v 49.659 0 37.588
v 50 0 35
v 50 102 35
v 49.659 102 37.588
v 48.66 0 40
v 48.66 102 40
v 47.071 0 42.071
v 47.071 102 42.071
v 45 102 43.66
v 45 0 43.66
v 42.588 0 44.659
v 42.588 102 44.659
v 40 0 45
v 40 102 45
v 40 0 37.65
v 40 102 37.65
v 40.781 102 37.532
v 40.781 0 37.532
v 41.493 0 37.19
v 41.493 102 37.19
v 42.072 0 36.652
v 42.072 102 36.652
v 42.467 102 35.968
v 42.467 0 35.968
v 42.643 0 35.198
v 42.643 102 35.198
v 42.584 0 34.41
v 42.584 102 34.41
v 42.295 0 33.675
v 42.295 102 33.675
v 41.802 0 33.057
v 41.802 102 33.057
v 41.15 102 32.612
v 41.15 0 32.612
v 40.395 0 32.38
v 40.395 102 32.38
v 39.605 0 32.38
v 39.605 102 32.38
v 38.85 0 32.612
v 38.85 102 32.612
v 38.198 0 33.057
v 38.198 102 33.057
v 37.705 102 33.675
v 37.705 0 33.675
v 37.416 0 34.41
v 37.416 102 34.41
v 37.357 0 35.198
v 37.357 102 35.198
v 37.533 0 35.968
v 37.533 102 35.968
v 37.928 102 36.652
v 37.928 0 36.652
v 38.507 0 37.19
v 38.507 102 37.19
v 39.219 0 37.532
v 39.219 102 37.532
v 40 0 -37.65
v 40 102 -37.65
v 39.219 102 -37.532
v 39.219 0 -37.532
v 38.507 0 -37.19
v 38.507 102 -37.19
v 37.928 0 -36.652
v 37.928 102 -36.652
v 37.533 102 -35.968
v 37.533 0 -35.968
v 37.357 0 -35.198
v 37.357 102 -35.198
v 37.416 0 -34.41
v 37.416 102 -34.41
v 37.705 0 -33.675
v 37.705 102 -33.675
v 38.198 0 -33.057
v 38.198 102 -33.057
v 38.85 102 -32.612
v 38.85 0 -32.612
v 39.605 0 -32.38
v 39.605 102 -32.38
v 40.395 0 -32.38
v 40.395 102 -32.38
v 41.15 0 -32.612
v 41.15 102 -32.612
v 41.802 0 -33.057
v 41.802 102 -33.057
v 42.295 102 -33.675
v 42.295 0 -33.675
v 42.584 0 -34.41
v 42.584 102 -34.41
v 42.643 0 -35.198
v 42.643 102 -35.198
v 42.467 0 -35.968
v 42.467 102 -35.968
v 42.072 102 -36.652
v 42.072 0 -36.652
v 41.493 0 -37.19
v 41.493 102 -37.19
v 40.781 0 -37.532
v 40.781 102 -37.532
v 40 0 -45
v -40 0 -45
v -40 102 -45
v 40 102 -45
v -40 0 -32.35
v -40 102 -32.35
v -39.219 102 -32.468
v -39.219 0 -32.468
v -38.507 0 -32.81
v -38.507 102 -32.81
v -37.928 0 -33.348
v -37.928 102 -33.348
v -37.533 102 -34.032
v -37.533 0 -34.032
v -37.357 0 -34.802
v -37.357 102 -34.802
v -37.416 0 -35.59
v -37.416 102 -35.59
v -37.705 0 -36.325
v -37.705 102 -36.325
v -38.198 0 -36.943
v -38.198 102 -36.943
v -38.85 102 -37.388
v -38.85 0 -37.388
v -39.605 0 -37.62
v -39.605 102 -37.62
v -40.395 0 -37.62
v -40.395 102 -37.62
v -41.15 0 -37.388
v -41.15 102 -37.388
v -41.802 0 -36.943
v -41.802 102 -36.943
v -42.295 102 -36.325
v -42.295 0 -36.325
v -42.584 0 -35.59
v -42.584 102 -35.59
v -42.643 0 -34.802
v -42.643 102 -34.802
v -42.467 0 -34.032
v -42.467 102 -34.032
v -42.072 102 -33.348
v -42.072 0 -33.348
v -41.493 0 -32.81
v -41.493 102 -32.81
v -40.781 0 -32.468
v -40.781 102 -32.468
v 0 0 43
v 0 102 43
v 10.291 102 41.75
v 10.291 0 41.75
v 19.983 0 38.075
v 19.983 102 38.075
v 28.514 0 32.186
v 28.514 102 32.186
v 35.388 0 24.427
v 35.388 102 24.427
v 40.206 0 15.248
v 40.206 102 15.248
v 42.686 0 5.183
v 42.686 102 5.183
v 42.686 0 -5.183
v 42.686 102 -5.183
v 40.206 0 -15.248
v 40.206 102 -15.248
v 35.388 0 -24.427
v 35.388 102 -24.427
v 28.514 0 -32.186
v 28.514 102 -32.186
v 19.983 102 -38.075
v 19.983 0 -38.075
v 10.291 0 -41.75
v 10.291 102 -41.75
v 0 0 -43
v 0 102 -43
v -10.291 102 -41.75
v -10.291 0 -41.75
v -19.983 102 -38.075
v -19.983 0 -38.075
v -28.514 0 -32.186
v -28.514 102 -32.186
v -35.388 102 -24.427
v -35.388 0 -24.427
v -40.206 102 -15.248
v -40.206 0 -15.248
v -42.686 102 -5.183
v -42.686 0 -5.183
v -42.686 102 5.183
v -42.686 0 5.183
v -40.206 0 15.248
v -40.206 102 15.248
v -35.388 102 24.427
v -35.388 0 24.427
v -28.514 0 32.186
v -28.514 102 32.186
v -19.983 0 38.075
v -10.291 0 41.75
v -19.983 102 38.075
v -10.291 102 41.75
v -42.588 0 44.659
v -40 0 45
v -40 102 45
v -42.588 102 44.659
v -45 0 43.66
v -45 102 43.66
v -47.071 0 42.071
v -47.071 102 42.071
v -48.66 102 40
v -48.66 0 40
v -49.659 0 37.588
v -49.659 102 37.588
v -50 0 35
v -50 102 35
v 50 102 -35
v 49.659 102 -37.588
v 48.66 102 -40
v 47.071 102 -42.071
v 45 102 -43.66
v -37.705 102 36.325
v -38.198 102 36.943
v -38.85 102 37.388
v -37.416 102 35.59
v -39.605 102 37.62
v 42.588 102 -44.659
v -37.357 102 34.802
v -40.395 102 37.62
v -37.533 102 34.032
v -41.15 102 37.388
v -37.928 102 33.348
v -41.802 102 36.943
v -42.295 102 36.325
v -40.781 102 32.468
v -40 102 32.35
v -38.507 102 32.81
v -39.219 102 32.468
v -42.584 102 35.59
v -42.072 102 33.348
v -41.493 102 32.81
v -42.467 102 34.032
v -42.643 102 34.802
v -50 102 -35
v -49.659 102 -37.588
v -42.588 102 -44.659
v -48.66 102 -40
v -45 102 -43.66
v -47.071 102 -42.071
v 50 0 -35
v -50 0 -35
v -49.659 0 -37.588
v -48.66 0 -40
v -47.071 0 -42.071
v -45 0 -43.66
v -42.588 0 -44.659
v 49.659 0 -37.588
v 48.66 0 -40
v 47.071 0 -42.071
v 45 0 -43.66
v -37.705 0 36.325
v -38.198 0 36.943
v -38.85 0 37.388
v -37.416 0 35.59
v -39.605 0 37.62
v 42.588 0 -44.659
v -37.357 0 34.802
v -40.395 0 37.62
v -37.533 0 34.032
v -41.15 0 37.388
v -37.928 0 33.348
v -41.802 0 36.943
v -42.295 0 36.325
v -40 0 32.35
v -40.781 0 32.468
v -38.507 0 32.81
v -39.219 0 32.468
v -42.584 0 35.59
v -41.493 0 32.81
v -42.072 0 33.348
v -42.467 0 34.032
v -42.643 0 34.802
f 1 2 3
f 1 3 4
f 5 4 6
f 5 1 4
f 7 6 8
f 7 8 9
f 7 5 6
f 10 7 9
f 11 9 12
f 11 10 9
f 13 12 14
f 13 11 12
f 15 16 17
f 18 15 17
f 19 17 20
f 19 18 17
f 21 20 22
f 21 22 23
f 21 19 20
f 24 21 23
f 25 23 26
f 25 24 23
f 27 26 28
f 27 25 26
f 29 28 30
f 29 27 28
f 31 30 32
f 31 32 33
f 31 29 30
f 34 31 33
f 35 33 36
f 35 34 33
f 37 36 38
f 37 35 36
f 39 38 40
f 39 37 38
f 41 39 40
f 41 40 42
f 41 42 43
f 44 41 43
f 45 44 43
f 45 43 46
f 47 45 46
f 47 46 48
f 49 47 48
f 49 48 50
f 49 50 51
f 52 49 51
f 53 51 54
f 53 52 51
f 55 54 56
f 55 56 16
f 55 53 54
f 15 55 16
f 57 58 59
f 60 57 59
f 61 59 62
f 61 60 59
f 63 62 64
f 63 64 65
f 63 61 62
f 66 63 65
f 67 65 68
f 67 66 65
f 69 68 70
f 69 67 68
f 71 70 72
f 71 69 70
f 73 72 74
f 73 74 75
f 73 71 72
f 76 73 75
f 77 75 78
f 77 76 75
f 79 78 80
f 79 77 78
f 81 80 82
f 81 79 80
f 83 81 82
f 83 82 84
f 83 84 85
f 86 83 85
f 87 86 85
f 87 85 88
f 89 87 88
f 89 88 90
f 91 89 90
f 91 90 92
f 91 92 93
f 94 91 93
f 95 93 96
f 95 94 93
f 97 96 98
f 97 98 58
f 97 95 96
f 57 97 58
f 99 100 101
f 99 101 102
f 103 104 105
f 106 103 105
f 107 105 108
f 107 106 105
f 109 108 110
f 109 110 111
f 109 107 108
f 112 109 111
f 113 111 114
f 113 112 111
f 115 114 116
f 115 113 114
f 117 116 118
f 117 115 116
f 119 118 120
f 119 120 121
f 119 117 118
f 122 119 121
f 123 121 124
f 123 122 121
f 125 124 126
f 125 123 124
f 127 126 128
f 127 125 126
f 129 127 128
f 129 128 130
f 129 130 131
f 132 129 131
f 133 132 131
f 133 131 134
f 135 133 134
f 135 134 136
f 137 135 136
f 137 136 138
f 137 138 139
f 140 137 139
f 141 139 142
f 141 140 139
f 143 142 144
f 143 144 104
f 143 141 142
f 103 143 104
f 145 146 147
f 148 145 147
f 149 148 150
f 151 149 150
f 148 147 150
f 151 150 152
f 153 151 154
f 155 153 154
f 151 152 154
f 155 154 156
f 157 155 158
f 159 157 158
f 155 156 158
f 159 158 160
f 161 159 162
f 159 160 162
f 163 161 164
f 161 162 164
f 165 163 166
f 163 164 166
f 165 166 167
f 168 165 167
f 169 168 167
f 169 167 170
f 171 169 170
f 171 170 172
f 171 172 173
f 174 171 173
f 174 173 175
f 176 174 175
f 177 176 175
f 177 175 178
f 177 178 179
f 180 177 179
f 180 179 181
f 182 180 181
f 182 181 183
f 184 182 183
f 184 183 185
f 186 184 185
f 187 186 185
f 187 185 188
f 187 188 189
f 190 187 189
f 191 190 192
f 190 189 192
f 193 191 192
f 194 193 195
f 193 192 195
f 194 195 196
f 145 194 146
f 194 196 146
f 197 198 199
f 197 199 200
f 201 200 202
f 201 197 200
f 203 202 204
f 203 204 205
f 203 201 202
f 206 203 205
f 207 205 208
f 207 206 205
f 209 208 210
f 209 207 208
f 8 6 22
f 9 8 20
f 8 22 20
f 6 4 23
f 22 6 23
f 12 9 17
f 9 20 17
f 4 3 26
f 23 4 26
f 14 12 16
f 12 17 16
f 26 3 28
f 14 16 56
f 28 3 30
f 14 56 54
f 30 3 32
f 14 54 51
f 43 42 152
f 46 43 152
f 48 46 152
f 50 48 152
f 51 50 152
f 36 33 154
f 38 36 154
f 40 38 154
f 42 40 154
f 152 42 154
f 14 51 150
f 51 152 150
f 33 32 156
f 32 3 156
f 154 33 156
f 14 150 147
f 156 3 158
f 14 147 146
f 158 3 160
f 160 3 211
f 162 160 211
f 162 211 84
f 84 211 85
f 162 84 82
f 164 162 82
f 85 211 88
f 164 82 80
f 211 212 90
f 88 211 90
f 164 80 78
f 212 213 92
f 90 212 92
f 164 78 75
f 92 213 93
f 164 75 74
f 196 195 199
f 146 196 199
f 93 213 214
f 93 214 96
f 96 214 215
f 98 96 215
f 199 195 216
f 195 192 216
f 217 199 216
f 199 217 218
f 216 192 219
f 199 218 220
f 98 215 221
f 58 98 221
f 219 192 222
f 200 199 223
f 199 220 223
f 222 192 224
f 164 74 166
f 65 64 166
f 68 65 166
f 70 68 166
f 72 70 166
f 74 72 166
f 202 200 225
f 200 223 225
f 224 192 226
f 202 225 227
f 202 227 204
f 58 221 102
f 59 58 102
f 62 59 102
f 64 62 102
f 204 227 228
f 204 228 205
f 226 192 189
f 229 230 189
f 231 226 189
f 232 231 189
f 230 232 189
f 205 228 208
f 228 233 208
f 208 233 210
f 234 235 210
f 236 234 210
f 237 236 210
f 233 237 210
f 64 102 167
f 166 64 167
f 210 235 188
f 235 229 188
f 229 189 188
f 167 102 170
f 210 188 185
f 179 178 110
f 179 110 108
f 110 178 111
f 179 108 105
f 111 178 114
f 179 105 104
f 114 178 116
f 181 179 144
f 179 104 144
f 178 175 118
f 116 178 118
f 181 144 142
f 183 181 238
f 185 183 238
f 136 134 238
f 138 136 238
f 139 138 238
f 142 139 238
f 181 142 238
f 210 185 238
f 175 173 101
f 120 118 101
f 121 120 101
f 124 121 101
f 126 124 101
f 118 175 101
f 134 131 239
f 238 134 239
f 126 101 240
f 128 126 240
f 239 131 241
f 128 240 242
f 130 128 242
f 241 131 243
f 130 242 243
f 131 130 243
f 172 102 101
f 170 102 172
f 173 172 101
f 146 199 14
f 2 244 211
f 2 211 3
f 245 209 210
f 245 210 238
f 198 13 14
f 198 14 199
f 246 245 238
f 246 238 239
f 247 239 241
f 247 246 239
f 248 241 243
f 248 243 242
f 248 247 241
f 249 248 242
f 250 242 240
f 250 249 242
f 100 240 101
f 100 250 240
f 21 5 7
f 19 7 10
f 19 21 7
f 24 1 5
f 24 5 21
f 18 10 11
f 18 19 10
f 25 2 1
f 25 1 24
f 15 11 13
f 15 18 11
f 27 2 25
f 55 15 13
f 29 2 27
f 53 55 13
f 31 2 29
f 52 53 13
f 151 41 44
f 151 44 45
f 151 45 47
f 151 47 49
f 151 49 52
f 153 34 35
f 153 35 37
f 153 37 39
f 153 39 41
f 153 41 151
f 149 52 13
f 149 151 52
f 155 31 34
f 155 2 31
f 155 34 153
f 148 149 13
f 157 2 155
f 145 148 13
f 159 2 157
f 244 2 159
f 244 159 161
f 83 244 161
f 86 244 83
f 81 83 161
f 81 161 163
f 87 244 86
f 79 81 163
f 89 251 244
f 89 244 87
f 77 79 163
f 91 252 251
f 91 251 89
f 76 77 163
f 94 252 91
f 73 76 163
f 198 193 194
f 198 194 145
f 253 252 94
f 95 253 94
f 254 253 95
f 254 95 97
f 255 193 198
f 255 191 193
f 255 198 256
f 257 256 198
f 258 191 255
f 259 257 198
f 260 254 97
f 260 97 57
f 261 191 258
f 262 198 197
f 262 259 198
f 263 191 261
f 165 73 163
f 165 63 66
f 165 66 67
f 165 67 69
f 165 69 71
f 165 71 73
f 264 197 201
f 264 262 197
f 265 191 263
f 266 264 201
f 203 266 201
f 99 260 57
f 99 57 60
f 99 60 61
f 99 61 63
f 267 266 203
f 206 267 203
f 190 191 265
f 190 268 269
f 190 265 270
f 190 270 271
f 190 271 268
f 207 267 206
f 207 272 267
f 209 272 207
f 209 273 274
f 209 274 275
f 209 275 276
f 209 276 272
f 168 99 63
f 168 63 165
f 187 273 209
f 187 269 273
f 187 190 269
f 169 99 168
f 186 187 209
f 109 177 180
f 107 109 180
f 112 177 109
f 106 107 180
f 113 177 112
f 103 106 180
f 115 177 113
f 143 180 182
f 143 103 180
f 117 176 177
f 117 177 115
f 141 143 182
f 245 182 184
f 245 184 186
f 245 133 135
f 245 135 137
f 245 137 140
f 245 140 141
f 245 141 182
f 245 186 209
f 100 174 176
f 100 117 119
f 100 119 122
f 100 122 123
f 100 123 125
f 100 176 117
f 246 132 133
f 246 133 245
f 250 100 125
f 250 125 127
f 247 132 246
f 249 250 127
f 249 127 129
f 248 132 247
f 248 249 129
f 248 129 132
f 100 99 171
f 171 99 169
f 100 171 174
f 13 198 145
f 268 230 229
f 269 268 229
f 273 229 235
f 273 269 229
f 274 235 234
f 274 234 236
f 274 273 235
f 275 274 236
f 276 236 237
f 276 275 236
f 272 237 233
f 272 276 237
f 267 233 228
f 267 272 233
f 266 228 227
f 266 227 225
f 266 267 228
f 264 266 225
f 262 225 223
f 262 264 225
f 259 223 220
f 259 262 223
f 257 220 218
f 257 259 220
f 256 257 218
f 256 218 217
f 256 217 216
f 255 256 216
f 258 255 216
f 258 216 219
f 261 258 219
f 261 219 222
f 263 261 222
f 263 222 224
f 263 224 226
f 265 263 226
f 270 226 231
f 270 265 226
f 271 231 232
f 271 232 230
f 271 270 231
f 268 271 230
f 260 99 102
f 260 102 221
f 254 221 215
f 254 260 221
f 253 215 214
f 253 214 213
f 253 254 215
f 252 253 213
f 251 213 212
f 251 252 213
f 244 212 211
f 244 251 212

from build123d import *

# Parameters (mm, degrees)
SKETCH_1_R          = 2.65
EXTRUDE_1_DEPTH     = 102
SKETCH_3_R          = 43
CUT_EXTRUDE_1_DEPTH = 123.184287042


with BuildPart() as part:
    # 草图1 → 凸台-拉伸1 (new body)
    with BuildSketch(Plane(origin=(0, 0, 0), x_dir=(1, 0, 0), z_dir=(0, 1, 0))):
        with BuildLine():
            Line((-40, 45), (40, 45))
            ThreePointArc((40, 45), (47.071067812, 42.071067812), (50, 35))
            Line((50, 35), (50, -35))
            ThreePointArc((50, -35), (47.071067812, -42.071067812), (40, -45))
            Line((40, -45), (-40, -45))
            ThreePointArc((-40, -45), (-47.071067812, -42.071067812), (-50, -35))
            Line((-50, -35), (-50, 35))
            ThreePointArc((-50, 35), (-47.071067812, 42.071067812), (-40, 45))
        make_face()
        with Locations(Location((-40, 35, 0), (0, 0, 270))):
            Circle(SKETCH_1_R, mode=Mode.SUBTRACT)
        with Locations(Location((40, 35, 0), (0, 0, 90))):
            Circle(SKETCH_1_R, mode=Mode.SUBTRACT)
        with Locations(Location((40, -35, 0), (0, 0, 270))):
            Circle(SKETCH_1_R, mode=Mode.SUBTRACT)
        with Locations(Location((-40, -35, 0), (0, 0, 90))):
            Circle(SKETCH_1_R, mode=Mode.SUBTRACT)
    extrude(amount=EXTRUDE_1_DEPTH)

    # 草图3 → 切除-拉伸1 (cut, through all)
    with BuildSketch(Plane(origin=(0, 102, 0), x_dir=(1, 0, 0), z_dir=(0, 1, 0))):
        with Locations(Location((0, 0, 0), (0, 0, 270))):
            Circle(SKETCH_3_R)
    extrude(amount=-CUT_EXTRUDE_1_DEPTH, mode=Mode.SUBTRACT)


solid = part.part
